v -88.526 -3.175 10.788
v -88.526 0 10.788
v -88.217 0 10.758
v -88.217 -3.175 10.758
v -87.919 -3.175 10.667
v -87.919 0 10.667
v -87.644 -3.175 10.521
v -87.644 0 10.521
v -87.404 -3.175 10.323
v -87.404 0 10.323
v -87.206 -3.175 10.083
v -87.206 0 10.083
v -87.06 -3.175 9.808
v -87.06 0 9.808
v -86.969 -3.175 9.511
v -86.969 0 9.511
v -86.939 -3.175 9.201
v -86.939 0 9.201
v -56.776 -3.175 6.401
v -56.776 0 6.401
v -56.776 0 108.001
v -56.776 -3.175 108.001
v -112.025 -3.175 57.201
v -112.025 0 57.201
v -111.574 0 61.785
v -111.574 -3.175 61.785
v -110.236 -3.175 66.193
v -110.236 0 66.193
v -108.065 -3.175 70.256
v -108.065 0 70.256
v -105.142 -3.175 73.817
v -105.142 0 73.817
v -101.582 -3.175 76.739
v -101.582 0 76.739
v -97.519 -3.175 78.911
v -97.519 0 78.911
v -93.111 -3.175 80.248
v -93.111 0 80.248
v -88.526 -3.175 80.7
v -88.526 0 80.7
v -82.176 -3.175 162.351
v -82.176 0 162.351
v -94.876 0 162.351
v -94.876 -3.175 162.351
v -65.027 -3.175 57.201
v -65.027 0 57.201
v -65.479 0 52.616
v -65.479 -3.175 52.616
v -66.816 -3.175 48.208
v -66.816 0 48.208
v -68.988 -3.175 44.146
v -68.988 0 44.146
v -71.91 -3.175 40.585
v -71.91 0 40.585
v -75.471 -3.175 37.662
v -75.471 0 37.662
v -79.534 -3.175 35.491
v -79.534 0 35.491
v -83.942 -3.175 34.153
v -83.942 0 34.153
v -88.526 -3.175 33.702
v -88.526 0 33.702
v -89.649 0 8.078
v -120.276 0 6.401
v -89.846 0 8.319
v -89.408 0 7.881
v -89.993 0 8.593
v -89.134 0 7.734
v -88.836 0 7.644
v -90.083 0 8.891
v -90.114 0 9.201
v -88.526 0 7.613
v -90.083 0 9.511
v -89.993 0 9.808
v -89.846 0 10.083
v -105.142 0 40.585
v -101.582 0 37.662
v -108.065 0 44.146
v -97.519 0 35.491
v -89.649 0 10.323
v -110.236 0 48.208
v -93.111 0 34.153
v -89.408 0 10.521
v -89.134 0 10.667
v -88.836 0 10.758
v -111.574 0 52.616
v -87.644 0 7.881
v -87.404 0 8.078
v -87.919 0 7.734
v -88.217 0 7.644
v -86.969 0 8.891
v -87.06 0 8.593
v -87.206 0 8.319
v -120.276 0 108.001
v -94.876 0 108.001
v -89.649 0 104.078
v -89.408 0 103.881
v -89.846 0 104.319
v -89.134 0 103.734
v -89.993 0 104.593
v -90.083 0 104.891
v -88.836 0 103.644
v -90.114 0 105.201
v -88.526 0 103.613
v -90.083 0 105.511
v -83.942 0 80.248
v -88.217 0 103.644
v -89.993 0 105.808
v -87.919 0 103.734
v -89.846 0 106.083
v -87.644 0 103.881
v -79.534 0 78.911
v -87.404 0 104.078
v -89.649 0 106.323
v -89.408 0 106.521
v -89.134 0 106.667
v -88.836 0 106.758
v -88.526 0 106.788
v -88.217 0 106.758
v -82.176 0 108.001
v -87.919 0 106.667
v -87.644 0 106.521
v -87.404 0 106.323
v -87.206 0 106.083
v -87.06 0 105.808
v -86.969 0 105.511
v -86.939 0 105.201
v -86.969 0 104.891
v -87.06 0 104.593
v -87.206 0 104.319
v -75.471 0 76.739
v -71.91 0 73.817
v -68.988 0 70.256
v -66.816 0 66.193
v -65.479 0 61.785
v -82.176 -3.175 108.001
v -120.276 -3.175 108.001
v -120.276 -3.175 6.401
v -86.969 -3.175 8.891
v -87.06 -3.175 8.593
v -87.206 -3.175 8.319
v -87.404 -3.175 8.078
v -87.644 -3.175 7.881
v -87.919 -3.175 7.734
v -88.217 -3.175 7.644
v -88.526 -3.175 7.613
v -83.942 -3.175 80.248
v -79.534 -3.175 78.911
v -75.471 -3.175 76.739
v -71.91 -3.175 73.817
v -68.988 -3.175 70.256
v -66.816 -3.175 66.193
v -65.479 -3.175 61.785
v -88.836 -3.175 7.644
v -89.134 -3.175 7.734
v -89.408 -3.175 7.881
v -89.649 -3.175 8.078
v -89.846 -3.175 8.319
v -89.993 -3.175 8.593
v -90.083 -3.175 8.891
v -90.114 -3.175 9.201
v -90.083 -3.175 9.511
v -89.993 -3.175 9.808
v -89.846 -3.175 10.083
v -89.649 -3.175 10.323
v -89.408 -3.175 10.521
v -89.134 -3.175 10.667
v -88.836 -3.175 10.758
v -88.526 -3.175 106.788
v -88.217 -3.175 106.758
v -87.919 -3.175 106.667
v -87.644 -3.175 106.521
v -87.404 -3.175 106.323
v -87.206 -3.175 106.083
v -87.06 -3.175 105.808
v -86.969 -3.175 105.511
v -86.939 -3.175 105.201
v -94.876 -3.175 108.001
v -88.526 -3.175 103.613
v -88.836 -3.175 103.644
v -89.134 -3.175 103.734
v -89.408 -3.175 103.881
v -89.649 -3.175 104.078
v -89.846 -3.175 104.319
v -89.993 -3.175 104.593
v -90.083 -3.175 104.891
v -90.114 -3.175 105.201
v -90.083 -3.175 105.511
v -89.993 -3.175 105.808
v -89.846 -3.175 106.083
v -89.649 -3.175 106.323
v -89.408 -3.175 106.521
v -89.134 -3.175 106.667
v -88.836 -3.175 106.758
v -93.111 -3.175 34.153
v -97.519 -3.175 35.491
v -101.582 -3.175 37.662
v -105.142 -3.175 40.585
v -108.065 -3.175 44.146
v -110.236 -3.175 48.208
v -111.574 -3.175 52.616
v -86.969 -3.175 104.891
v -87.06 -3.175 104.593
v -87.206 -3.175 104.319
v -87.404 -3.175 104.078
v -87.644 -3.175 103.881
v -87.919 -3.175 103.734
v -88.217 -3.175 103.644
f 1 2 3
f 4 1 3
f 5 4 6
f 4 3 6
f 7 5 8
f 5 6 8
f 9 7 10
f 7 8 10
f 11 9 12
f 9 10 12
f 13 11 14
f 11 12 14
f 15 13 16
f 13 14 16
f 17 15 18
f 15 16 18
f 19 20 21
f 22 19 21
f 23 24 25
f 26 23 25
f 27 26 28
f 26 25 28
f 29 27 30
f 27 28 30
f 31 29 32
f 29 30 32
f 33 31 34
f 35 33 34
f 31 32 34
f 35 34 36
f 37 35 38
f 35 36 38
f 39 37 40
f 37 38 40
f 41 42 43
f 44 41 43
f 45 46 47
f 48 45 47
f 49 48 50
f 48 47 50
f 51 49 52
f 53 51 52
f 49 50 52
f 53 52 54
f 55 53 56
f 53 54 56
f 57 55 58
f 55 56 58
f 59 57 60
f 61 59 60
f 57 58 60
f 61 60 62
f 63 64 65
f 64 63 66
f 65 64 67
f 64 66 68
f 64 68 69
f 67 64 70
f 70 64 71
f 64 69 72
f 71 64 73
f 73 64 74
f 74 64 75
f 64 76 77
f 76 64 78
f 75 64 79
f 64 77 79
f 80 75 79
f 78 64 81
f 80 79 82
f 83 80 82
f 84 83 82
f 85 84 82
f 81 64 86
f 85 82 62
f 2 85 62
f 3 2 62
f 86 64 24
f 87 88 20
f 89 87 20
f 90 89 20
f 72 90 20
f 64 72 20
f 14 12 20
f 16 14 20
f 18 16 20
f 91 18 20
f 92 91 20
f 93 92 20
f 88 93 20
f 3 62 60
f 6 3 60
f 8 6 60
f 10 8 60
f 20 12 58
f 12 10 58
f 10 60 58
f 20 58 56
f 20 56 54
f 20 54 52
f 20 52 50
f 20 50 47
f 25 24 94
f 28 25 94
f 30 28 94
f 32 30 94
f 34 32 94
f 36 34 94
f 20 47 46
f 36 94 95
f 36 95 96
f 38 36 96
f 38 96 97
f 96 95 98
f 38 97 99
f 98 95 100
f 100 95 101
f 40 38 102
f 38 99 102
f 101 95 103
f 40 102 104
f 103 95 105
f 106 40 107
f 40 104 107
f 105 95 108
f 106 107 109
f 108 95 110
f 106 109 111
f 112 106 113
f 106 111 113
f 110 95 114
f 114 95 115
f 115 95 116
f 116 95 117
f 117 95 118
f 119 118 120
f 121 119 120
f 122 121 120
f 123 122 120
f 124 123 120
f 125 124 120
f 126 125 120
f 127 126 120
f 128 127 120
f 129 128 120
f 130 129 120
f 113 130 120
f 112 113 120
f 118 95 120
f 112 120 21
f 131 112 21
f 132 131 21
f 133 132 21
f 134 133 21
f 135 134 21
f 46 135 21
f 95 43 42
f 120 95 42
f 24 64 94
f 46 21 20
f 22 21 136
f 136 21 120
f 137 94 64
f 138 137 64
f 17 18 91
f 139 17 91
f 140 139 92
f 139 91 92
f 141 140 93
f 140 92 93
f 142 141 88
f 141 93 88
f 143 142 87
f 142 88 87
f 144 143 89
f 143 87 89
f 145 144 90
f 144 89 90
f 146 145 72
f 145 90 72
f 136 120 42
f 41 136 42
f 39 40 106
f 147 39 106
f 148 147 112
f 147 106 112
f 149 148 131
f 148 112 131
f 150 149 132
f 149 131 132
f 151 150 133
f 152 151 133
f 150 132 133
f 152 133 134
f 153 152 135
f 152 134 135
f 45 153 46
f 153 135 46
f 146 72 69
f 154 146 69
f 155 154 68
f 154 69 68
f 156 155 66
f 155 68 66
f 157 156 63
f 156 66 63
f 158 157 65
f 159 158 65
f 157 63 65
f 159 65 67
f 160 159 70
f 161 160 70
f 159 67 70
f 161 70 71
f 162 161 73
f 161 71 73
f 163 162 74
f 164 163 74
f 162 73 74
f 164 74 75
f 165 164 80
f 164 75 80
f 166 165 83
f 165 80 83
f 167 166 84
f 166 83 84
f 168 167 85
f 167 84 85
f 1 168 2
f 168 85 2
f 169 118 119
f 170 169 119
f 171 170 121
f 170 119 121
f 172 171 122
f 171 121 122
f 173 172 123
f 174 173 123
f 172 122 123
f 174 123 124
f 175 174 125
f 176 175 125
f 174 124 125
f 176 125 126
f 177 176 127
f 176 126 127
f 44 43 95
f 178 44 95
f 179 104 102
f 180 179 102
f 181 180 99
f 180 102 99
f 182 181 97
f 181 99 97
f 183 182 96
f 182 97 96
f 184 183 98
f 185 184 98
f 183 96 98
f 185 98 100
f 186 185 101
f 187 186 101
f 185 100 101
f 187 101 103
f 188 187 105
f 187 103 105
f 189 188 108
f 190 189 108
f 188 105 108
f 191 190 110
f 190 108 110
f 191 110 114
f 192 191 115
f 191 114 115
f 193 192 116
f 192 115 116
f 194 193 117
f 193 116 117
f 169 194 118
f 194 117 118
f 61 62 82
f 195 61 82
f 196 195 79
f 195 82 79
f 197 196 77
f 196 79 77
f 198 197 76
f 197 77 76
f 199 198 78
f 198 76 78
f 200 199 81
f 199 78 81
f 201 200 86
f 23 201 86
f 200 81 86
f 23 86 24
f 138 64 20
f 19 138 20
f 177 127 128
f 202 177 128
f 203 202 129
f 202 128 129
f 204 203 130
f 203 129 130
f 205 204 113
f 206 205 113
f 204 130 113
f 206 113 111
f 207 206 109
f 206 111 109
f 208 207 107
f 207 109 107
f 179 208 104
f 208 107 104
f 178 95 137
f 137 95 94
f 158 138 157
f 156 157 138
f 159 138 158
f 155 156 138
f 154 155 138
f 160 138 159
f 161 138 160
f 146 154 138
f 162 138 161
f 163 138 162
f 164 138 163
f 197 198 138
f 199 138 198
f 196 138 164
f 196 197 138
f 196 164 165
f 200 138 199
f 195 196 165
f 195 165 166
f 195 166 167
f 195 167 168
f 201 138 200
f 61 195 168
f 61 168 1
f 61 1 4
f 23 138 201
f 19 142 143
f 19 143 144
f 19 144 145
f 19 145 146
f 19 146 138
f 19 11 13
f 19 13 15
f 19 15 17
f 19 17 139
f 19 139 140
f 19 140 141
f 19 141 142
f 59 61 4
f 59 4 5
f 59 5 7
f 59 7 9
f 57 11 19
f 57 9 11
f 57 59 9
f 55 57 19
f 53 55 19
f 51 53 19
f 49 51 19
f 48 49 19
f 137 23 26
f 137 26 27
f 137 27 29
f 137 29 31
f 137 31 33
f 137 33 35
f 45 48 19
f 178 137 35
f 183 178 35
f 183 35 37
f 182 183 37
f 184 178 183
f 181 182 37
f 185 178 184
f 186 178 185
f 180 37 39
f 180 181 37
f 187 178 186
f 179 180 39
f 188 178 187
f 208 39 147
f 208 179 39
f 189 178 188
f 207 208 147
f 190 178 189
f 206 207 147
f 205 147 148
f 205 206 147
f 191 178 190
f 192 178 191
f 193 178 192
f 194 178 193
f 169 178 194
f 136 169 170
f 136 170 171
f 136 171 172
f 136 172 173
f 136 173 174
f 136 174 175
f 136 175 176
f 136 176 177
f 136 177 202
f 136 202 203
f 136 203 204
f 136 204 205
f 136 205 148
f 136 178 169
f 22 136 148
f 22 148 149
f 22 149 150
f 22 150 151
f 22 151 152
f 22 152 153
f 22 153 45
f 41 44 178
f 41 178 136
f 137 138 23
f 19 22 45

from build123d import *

# Parameters (mm, degrees)
F1_DEPTH = 3.175


# Not quite as in the source:
# - a feature names something its author has since deleted; it is built from what else it names


with BuildPart() as f1:
    # F0 (on Front) → F1 (new body)
    with BuildSketch(Plane.XZ):
        with BuildLine():
            Line((-94.8762850642, 108.0007998444), (-120.2762850642, 108.0007998444))
            Line((-120.2762850642, 108.0007998444), (-120.2762850642, 57.2007998444))
            Line((-120.2762850642, 57.2007998444), (-112.0251095462, 57.2007998444))
            ThreePointArc((-112.0251095462, 57.2007998444), (-105.1424632053, 73.8169779855), (-88.5262850642, 80.6996243264))
            Line((-88.5262850642, 80.6996243264), (-88.5262850642, 103.6132998444))
            ThreePointArc((-88.5262850642, 103.6132998444), (-90.1137850642, 105.2007998444), (-88.5262850642, 106.7882998444))
            Line((-88.5262850642, 106.7882998444), (-88.5262850642, 108.0007998444))
            Line((-88.5262850642, 108.0007998444), (-94.8762850642, 108.0007998444))
        make_face()
        with BuildLine():
            Line((-82.1762850642, 108.0007998444), (-88.5262850642, 108.0007998444))
            Line((-88.5262850642, 108.0007998444), (-88.5262850642, 106.7882998444))
            ThreePointArc((-88.5262850642, 106.7882998444), (-87.4037530491, 106.3233318595), (-86.9387850642, 105.2007998444))
            ThreePointArc((-86.9387850642, 105.2007998444), (-87.4037530491, 104.0782678293), (-88.5262850642, 103.6132998444))
            Line((-88.5262850642, 103.6132998444), (-88.5262850642, 80.6996243264))
            ThreePointArc((-88.5262850642, 80.6996243264), (-71.9101069231, 73.8169779855), (-65.0274605822, 57.2007998444))
            ThreePointArc((-65.0274605822, 57.2007998444), (-71.9101069231, 40.5846217033), (-88.5262850642, 33.7019753624))
            Line((-88.5262850642, 33.7019753624), (-88.5262850642, 10.7882998444))
            ThreePointArc((-88.5262850642, 10.7882998444), (-87.4037530491, 10.3233318595), (-86.9387850642, 9.2007998444))
            ThreePointArc((-86.9387850642, 9.2007998444), (-87.4037530491, 8.0782678293), (-88.5262850642, 7.6132998444))
            Line((-88.5262850642, 7.6132998444), (-88.5262850642, 6.4007998444))
            Line((-88.5262850642, 6.4007998444), (-56.7762850642, 6.4007998444))
            Line((-56.7762850642, 6.4007998444), (-56.7762850642, 108.0007998444))
            Line((-56.7762850642, 108.0007998444), (-82.1762850642, 108.0007998444))
        make_face()
        with BuildLine():
            Line((-112.0251095462, 57.2007998444), (-120.2762850642, 57.2007998444))
            Line((-120.2762850642, 57.2007998444), (-120.2762850642, 6.4007998444))
            Line((-120.2762850642, 6.4007998444), (-88.5262850642, 6.4007998444))
            Line((-88.5262850642, 6.4007998444), (-88.5262850642, 7.6132998444))
            ThreePointArc((-88.5262850642, 7.6132998444), (-90.1137850642, 9.2007998444), (-88.5262850642, 10.7882998444))
            Line((-88.5262850642, 10.7882998444), (-88.5262850642, 33.7019753624))
            ThreePointArc((-88.5262850642, 33.7019753624), (-105.1424632053, 40.5846217033), (-112.0251095462, 57.2007998444))
        make_face()
        Polygon((-94.8762850642, 162.3507998444), (-94.8762850642, 108.0007998444), (-88.5262850642, 108.0007998444), (-82.1762850642, 108.0007998444), (-82.1762850642, 162.3507998444), align=None)
    extrude(amount=F1_DEPTH)


solid = f1.part
